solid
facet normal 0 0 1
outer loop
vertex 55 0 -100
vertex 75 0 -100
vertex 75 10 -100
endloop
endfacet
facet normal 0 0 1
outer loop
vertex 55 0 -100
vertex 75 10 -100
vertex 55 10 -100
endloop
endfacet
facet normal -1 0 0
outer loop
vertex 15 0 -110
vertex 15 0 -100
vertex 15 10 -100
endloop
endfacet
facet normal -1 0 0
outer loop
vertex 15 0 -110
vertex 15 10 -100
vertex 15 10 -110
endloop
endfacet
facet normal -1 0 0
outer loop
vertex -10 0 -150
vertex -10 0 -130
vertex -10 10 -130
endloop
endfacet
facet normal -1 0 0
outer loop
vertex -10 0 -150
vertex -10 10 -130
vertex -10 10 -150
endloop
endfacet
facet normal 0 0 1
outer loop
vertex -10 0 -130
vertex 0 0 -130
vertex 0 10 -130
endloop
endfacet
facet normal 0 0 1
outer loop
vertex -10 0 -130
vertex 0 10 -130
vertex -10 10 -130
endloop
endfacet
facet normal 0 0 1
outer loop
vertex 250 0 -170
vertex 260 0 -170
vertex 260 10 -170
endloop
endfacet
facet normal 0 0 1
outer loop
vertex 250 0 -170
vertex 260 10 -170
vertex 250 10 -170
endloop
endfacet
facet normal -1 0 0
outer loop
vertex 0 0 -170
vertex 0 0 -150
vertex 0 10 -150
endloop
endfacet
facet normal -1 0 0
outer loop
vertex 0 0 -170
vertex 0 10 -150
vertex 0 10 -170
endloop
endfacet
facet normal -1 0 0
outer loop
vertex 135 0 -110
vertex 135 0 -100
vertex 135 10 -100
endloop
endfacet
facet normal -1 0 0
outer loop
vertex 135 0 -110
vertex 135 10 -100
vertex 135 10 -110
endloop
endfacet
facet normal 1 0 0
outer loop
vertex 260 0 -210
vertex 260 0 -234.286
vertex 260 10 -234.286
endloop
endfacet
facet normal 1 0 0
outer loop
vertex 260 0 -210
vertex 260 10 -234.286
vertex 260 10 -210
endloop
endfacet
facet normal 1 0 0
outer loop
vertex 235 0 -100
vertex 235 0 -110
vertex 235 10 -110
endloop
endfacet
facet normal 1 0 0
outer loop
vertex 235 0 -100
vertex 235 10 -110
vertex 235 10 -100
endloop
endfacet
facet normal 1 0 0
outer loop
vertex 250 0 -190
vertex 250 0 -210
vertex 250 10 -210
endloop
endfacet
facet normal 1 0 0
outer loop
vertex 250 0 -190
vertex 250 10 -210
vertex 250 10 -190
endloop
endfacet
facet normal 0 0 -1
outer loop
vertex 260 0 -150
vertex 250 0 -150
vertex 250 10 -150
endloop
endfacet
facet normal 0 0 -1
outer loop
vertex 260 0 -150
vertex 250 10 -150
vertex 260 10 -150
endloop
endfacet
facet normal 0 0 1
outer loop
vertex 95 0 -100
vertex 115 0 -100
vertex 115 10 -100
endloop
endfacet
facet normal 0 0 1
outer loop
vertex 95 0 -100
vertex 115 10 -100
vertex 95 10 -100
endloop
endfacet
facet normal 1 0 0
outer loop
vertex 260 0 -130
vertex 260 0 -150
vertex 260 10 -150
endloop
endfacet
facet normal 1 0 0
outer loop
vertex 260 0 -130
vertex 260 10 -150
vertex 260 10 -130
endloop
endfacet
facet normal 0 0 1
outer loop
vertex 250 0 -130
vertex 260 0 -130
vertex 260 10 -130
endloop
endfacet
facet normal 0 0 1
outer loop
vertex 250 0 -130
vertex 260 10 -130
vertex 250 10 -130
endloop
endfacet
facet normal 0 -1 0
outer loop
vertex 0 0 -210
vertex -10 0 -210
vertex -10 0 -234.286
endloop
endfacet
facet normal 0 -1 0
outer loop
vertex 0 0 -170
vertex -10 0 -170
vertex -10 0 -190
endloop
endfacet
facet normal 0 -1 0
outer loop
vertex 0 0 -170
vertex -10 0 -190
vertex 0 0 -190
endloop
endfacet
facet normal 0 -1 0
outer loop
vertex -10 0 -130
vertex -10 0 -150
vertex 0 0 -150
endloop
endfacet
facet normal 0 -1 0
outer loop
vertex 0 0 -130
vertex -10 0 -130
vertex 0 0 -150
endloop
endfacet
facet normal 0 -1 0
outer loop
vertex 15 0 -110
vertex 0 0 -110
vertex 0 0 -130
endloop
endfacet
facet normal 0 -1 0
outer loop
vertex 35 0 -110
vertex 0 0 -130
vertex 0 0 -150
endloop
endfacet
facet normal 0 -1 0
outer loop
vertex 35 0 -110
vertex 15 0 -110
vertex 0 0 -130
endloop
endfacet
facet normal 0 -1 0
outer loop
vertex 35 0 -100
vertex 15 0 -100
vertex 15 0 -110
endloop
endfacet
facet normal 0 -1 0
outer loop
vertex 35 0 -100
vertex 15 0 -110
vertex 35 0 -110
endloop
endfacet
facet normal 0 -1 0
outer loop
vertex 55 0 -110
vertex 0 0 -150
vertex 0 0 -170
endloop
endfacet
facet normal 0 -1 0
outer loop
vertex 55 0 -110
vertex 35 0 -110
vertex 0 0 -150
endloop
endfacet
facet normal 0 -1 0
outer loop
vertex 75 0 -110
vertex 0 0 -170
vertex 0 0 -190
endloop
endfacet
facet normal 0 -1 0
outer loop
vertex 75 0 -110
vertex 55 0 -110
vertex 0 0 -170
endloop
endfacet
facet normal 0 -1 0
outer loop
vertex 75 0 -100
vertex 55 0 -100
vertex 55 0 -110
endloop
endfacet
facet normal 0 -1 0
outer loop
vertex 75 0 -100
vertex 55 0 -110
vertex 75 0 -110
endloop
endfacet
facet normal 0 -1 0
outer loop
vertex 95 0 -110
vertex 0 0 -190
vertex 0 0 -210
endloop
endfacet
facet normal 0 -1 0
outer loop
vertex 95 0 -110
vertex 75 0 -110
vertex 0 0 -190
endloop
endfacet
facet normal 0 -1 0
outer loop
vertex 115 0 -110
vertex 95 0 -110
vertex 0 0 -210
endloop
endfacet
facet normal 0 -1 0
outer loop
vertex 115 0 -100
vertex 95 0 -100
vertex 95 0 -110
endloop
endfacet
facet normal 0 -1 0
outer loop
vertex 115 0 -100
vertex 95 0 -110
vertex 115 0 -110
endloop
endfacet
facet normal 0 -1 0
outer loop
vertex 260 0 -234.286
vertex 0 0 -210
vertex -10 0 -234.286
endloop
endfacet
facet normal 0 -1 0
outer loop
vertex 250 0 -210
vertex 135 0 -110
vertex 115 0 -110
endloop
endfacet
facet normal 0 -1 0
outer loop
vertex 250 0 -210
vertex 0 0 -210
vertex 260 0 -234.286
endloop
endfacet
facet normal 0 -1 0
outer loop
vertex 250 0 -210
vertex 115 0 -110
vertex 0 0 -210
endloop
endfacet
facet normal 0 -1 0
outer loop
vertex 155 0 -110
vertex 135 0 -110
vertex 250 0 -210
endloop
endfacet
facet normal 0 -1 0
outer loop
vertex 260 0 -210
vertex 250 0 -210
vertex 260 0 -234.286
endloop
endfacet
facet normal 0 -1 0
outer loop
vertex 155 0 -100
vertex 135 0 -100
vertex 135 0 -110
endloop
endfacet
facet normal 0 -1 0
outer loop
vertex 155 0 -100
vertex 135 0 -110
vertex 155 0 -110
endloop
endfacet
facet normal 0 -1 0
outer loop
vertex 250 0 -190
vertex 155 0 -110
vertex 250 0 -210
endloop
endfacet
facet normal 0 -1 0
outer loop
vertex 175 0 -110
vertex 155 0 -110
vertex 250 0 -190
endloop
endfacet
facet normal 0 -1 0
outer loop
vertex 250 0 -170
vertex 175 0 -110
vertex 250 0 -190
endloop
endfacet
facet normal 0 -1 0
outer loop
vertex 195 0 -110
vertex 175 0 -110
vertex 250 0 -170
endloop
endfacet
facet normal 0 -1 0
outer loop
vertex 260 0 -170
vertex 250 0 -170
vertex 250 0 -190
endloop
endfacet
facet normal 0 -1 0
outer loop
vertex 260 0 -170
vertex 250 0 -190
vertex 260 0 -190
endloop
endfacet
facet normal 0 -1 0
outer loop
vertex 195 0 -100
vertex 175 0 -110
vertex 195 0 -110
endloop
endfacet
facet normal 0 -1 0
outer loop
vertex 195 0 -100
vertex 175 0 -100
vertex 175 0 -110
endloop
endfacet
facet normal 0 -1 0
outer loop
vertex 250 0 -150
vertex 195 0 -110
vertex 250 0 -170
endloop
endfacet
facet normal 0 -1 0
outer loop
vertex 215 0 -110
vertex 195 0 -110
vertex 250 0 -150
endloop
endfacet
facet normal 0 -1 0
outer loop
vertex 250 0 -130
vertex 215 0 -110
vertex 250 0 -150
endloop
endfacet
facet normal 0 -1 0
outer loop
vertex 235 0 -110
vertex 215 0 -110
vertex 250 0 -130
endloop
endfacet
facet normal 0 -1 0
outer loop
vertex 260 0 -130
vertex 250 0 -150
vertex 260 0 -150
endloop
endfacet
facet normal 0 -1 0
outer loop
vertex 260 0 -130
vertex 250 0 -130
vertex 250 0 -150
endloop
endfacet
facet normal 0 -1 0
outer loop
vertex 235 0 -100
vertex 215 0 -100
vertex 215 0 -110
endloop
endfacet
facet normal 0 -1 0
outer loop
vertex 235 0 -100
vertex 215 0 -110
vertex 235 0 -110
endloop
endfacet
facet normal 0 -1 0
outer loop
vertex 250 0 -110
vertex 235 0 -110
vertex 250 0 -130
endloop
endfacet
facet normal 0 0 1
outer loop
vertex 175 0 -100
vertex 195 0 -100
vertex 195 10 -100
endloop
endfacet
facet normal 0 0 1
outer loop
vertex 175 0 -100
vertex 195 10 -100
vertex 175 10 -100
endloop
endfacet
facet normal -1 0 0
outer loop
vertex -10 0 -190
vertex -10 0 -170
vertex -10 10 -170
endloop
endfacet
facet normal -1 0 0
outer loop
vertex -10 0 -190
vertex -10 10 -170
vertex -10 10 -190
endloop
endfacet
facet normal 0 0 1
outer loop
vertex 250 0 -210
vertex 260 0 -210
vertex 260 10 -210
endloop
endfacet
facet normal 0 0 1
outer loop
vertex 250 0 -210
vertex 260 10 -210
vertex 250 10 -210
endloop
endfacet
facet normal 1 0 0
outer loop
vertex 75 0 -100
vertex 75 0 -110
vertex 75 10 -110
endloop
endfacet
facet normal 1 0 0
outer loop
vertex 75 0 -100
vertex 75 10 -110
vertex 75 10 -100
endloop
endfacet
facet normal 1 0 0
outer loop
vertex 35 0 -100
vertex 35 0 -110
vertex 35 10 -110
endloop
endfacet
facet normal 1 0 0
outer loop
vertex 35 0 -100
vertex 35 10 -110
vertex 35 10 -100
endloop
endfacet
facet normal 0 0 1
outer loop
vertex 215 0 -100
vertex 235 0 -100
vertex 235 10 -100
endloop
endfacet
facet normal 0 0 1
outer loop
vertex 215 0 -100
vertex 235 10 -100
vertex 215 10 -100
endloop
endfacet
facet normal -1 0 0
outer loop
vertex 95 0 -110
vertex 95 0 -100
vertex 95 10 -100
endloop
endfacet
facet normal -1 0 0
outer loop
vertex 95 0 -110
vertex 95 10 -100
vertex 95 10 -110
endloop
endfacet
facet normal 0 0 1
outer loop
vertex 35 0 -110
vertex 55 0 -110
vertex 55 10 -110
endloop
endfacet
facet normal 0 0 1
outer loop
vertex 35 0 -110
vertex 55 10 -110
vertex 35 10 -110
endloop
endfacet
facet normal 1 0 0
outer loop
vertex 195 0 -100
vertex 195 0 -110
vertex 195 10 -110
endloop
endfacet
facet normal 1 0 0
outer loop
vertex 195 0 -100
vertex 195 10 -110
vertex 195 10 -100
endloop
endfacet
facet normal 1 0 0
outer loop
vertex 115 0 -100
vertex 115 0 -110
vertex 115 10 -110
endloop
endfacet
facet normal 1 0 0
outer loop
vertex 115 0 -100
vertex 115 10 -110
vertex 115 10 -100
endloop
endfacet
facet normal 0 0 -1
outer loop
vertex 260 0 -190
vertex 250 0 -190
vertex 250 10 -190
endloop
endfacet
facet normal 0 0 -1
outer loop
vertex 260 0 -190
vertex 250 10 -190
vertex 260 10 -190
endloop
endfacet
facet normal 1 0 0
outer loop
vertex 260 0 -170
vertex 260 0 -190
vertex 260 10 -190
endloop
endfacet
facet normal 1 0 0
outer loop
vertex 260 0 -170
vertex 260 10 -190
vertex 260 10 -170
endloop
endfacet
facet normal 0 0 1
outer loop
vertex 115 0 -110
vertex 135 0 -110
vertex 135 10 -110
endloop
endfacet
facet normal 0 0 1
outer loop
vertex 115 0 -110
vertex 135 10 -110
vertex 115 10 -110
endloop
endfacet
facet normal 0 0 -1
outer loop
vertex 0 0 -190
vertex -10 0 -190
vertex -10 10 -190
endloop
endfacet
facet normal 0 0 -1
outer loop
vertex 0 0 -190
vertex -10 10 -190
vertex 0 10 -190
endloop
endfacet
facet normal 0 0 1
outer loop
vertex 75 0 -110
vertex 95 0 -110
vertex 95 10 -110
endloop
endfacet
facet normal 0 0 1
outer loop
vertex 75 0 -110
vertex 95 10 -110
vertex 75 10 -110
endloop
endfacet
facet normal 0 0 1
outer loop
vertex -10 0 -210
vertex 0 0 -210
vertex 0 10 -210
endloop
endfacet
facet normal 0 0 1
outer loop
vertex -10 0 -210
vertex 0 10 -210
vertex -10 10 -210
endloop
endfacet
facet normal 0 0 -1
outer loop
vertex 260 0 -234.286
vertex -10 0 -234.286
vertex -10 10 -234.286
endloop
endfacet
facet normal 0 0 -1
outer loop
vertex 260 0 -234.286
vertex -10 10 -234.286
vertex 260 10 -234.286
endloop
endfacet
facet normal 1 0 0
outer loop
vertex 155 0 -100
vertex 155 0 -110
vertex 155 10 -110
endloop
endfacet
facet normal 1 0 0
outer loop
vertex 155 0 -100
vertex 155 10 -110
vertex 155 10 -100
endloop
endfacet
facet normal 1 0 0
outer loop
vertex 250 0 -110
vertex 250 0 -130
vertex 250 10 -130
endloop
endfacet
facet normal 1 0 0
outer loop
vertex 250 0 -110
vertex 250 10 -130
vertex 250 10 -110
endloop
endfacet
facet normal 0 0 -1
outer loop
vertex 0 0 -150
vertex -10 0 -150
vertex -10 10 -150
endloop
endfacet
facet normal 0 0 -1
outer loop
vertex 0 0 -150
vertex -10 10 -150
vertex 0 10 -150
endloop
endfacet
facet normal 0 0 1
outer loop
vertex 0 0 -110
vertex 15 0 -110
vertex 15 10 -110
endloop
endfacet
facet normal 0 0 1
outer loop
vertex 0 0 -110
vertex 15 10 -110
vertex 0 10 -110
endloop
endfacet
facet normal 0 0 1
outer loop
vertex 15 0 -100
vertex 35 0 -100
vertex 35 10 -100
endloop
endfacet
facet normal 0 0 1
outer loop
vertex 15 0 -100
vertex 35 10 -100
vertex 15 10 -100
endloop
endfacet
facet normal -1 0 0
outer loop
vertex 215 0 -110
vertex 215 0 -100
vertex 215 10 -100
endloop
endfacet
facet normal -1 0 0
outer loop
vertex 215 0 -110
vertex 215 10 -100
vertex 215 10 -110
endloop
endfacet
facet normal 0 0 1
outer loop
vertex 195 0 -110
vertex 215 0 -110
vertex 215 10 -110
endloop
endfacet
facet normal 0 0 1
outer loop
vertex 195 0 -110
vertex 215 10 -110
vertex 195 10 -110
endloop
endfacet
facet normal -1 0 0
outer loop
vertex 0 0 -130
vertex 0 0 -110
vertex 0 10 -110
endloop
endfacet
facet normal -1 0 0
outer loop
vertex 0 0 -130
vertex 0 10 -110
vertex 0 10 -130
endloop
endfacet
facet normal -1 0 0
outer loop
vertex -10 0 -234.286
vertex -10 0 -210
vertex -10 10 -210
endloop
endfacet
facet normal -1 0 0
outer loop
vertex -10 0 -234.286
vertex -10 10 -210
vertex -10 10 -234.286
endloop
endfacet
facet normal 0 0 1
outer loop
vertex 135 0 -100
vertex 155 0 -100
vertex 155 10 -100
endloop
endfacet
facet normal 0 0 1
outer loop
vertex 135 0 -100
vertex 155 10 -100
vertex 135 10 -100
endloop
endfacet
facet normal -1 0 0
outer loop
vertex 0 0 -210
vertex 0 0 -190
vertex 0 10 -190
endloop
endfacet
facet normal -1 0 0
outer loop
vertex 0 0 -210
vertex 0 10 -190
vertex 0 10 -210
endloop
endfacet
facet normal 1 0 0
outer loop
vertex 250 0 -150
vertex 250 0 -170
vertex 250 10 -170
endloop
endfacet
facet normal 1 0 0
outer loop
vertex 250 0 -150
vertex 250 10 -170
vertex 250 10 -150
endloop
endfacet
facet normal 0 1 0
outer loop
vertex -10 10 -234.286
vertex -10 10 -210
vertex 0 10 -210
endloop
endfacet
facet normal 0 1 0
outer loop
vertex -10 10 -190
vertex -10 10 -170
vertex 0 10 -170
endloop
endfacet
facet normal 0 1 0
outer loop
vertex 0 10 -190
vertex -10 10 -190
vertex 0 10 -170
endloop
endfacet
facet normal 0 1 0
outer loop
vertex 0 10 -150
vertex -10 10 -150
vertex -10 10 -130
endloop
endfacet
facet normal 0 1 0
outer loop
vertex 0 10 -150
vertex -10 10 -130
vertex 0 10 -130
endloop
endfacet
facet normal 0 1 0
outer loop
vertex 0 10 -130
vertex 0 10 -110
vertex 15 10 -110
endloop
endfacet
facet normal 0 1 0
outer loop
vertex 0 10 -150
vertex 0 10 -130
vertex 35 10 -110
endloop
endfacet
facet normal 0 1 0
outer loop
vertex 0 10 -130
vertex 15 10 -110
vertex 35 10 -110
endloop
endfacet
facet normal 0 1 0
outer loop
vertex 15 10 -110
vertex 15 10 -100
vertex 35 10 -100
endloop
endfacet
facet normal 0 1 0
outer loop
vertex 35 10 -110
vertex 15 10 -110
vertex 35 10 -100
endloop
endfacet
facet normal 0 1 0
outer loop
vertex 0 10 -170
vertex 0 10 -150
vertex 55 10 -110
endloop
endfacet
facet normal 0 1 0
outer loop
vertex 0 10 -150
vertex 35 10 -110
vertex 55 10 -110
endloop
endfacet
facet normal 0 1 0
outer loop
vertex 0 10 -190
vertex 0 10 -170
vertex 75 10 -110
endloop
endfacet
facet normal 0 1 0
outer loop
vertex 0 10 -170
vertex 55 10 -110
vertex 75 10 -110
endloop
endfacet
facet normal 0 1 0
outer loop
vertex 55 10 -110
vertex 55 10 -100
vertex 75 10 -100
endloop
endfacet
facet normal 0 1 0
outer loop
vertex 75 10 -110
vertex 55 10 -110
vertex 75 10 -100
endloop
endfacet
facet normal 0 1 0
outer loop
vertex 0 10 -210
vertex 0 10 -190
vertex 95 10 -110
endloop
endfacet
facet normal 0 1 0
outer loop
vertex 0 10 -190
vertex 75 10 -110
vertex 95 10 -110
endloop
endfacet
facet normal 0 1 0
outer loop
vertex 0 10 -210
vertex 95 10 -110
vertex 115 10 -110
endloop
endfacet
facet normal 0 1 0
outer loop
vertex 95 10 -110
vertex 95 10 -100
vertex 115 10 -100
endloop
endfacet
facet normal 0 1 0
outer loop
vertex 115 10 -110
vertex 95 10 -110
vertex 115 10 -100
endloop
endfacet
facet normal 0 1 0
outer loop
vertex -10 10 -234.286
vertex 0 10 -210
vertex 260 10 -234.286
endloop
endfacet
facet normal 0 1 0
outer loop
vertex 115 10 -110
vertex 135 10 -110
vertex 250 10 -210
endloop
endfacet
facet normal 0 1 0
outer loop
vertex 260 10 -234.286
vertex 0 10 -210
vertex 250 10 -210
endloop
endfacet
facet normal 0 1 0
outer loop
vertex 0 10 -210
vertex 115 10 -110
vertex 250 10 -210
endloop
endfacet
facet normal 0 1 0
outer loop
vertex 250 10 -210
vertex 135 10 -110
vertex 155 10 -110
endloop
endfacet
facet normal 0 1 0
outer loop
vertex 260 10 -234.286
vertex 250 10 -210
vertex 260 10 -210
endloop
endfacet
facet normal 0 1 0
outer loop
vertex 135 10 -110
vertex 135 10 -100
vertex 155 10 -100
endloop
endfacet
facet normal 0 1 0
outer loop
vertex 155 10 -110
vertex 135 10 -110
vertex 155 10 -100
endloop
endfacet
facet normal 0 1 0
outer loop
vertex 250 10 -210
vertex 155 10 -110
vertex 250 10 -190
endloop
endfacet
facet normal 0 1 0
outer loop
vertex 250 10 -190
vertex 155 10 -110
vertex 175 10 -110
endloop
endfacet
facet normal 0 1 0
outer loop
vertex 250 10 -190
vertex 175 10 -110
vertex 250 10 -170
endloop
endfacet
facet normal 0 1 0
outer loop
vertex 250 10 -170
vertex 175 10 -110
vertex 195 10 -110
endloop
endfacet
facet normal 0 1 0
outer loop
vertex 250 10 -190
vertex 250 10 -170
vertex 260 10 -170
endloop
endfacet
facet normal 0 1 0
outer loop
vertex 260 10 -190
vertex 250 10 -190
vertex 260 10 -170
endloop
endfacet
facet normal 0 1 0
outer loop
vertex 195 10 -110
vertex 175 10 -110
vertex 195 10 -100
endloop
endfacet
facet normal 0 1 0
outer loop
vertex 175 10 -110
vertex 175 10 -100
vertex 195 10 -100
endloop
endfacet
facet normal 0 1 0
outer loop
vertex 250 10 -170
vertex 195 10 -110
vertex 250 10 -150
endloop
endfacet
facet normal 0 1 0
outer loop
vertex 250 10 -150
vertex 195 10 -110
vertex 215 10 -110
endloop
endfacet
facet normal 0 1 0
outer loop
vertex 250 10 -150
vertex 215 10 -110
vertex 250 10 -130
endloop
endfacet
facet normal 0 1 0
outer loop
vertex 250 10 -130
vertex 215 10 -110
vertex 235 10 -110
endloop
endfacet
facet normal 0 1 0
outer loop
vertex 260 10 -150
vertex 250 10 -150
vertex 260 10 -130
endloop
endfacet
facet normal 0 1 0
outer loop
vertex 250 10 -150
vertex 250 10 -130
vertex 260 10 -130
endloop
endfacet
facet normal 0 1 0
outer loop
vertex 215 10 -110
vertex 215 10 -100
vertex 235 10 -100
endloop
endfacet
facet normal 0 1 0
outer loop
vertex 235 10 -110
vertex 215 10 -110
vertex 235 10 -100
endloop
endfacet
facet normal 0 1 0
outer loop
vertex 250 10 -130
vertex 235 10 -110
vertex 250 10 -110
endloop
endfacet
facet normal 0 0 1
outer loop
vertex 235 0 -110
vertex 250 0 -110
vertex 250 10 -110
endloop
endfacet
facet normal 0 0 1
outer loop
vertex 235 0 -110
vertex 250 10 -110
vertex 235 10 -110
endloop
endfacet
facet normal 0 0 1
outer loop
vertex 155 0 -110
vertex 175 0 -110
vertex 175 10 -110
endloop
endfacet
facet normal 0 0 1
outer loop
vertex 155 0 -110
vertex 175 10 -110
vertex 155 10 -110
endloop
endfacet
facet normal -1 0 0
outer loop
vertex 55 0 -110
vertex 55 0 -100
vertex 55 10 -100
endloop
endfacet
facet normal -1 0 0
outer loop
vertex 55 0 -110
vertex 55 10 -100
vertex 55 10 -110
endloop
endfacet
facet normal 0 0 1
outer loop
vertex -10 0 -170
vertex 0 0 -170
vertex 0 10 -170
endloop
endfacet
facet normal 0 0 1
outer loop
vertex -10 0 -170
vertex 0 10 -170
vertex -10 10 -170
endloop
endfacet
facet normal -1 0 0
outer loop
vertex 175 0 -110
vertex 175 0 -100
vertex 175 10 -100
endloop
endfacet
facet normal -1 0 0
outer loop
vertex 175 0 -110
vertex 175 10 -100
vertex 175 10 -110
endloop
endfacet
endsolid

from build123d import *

# Parameters (mm, degrees)
F1_DEPTH = 10


# Not quite as in the source:
# - a feature names something its author has since deleted; it is built from what else it names


with BuildPart() as f1:
    # F0 (on Front) → F1 (new body)
    with BuildSketch(Plane.XZ):
        Polygon((135, -100), (135, -110), (115, -110), (115, -100), (95, -100), (95, -110), (75, -110), (75, -100), (55, -100), (55, -110), (35, -110), (35, -100), (15, -100), (15, -110), (0, -110), (0, -130), (-10, -130), (-10, -150), (0, -150), (0, -170), (-10, -170), (-10, -190), (0, -190), (0, -210), (-10, -210), (-10, -234.2857142857), (260, -234.2857142857), (260, -210), (250, -210), (250, -190), (260, -190), (260, -170), (250, -170), (250, -150), (260, -150), (260, -130), (250, -130), (250, -110), (235, -110), (235, -100), (215, -100), (215, -110), (195, -110), (195, -100), (175, -100), (175, -110), (155, -110), (155, -100), align=None)
    extrude(amount=-F1_DEPTH)


solid = f1.part
